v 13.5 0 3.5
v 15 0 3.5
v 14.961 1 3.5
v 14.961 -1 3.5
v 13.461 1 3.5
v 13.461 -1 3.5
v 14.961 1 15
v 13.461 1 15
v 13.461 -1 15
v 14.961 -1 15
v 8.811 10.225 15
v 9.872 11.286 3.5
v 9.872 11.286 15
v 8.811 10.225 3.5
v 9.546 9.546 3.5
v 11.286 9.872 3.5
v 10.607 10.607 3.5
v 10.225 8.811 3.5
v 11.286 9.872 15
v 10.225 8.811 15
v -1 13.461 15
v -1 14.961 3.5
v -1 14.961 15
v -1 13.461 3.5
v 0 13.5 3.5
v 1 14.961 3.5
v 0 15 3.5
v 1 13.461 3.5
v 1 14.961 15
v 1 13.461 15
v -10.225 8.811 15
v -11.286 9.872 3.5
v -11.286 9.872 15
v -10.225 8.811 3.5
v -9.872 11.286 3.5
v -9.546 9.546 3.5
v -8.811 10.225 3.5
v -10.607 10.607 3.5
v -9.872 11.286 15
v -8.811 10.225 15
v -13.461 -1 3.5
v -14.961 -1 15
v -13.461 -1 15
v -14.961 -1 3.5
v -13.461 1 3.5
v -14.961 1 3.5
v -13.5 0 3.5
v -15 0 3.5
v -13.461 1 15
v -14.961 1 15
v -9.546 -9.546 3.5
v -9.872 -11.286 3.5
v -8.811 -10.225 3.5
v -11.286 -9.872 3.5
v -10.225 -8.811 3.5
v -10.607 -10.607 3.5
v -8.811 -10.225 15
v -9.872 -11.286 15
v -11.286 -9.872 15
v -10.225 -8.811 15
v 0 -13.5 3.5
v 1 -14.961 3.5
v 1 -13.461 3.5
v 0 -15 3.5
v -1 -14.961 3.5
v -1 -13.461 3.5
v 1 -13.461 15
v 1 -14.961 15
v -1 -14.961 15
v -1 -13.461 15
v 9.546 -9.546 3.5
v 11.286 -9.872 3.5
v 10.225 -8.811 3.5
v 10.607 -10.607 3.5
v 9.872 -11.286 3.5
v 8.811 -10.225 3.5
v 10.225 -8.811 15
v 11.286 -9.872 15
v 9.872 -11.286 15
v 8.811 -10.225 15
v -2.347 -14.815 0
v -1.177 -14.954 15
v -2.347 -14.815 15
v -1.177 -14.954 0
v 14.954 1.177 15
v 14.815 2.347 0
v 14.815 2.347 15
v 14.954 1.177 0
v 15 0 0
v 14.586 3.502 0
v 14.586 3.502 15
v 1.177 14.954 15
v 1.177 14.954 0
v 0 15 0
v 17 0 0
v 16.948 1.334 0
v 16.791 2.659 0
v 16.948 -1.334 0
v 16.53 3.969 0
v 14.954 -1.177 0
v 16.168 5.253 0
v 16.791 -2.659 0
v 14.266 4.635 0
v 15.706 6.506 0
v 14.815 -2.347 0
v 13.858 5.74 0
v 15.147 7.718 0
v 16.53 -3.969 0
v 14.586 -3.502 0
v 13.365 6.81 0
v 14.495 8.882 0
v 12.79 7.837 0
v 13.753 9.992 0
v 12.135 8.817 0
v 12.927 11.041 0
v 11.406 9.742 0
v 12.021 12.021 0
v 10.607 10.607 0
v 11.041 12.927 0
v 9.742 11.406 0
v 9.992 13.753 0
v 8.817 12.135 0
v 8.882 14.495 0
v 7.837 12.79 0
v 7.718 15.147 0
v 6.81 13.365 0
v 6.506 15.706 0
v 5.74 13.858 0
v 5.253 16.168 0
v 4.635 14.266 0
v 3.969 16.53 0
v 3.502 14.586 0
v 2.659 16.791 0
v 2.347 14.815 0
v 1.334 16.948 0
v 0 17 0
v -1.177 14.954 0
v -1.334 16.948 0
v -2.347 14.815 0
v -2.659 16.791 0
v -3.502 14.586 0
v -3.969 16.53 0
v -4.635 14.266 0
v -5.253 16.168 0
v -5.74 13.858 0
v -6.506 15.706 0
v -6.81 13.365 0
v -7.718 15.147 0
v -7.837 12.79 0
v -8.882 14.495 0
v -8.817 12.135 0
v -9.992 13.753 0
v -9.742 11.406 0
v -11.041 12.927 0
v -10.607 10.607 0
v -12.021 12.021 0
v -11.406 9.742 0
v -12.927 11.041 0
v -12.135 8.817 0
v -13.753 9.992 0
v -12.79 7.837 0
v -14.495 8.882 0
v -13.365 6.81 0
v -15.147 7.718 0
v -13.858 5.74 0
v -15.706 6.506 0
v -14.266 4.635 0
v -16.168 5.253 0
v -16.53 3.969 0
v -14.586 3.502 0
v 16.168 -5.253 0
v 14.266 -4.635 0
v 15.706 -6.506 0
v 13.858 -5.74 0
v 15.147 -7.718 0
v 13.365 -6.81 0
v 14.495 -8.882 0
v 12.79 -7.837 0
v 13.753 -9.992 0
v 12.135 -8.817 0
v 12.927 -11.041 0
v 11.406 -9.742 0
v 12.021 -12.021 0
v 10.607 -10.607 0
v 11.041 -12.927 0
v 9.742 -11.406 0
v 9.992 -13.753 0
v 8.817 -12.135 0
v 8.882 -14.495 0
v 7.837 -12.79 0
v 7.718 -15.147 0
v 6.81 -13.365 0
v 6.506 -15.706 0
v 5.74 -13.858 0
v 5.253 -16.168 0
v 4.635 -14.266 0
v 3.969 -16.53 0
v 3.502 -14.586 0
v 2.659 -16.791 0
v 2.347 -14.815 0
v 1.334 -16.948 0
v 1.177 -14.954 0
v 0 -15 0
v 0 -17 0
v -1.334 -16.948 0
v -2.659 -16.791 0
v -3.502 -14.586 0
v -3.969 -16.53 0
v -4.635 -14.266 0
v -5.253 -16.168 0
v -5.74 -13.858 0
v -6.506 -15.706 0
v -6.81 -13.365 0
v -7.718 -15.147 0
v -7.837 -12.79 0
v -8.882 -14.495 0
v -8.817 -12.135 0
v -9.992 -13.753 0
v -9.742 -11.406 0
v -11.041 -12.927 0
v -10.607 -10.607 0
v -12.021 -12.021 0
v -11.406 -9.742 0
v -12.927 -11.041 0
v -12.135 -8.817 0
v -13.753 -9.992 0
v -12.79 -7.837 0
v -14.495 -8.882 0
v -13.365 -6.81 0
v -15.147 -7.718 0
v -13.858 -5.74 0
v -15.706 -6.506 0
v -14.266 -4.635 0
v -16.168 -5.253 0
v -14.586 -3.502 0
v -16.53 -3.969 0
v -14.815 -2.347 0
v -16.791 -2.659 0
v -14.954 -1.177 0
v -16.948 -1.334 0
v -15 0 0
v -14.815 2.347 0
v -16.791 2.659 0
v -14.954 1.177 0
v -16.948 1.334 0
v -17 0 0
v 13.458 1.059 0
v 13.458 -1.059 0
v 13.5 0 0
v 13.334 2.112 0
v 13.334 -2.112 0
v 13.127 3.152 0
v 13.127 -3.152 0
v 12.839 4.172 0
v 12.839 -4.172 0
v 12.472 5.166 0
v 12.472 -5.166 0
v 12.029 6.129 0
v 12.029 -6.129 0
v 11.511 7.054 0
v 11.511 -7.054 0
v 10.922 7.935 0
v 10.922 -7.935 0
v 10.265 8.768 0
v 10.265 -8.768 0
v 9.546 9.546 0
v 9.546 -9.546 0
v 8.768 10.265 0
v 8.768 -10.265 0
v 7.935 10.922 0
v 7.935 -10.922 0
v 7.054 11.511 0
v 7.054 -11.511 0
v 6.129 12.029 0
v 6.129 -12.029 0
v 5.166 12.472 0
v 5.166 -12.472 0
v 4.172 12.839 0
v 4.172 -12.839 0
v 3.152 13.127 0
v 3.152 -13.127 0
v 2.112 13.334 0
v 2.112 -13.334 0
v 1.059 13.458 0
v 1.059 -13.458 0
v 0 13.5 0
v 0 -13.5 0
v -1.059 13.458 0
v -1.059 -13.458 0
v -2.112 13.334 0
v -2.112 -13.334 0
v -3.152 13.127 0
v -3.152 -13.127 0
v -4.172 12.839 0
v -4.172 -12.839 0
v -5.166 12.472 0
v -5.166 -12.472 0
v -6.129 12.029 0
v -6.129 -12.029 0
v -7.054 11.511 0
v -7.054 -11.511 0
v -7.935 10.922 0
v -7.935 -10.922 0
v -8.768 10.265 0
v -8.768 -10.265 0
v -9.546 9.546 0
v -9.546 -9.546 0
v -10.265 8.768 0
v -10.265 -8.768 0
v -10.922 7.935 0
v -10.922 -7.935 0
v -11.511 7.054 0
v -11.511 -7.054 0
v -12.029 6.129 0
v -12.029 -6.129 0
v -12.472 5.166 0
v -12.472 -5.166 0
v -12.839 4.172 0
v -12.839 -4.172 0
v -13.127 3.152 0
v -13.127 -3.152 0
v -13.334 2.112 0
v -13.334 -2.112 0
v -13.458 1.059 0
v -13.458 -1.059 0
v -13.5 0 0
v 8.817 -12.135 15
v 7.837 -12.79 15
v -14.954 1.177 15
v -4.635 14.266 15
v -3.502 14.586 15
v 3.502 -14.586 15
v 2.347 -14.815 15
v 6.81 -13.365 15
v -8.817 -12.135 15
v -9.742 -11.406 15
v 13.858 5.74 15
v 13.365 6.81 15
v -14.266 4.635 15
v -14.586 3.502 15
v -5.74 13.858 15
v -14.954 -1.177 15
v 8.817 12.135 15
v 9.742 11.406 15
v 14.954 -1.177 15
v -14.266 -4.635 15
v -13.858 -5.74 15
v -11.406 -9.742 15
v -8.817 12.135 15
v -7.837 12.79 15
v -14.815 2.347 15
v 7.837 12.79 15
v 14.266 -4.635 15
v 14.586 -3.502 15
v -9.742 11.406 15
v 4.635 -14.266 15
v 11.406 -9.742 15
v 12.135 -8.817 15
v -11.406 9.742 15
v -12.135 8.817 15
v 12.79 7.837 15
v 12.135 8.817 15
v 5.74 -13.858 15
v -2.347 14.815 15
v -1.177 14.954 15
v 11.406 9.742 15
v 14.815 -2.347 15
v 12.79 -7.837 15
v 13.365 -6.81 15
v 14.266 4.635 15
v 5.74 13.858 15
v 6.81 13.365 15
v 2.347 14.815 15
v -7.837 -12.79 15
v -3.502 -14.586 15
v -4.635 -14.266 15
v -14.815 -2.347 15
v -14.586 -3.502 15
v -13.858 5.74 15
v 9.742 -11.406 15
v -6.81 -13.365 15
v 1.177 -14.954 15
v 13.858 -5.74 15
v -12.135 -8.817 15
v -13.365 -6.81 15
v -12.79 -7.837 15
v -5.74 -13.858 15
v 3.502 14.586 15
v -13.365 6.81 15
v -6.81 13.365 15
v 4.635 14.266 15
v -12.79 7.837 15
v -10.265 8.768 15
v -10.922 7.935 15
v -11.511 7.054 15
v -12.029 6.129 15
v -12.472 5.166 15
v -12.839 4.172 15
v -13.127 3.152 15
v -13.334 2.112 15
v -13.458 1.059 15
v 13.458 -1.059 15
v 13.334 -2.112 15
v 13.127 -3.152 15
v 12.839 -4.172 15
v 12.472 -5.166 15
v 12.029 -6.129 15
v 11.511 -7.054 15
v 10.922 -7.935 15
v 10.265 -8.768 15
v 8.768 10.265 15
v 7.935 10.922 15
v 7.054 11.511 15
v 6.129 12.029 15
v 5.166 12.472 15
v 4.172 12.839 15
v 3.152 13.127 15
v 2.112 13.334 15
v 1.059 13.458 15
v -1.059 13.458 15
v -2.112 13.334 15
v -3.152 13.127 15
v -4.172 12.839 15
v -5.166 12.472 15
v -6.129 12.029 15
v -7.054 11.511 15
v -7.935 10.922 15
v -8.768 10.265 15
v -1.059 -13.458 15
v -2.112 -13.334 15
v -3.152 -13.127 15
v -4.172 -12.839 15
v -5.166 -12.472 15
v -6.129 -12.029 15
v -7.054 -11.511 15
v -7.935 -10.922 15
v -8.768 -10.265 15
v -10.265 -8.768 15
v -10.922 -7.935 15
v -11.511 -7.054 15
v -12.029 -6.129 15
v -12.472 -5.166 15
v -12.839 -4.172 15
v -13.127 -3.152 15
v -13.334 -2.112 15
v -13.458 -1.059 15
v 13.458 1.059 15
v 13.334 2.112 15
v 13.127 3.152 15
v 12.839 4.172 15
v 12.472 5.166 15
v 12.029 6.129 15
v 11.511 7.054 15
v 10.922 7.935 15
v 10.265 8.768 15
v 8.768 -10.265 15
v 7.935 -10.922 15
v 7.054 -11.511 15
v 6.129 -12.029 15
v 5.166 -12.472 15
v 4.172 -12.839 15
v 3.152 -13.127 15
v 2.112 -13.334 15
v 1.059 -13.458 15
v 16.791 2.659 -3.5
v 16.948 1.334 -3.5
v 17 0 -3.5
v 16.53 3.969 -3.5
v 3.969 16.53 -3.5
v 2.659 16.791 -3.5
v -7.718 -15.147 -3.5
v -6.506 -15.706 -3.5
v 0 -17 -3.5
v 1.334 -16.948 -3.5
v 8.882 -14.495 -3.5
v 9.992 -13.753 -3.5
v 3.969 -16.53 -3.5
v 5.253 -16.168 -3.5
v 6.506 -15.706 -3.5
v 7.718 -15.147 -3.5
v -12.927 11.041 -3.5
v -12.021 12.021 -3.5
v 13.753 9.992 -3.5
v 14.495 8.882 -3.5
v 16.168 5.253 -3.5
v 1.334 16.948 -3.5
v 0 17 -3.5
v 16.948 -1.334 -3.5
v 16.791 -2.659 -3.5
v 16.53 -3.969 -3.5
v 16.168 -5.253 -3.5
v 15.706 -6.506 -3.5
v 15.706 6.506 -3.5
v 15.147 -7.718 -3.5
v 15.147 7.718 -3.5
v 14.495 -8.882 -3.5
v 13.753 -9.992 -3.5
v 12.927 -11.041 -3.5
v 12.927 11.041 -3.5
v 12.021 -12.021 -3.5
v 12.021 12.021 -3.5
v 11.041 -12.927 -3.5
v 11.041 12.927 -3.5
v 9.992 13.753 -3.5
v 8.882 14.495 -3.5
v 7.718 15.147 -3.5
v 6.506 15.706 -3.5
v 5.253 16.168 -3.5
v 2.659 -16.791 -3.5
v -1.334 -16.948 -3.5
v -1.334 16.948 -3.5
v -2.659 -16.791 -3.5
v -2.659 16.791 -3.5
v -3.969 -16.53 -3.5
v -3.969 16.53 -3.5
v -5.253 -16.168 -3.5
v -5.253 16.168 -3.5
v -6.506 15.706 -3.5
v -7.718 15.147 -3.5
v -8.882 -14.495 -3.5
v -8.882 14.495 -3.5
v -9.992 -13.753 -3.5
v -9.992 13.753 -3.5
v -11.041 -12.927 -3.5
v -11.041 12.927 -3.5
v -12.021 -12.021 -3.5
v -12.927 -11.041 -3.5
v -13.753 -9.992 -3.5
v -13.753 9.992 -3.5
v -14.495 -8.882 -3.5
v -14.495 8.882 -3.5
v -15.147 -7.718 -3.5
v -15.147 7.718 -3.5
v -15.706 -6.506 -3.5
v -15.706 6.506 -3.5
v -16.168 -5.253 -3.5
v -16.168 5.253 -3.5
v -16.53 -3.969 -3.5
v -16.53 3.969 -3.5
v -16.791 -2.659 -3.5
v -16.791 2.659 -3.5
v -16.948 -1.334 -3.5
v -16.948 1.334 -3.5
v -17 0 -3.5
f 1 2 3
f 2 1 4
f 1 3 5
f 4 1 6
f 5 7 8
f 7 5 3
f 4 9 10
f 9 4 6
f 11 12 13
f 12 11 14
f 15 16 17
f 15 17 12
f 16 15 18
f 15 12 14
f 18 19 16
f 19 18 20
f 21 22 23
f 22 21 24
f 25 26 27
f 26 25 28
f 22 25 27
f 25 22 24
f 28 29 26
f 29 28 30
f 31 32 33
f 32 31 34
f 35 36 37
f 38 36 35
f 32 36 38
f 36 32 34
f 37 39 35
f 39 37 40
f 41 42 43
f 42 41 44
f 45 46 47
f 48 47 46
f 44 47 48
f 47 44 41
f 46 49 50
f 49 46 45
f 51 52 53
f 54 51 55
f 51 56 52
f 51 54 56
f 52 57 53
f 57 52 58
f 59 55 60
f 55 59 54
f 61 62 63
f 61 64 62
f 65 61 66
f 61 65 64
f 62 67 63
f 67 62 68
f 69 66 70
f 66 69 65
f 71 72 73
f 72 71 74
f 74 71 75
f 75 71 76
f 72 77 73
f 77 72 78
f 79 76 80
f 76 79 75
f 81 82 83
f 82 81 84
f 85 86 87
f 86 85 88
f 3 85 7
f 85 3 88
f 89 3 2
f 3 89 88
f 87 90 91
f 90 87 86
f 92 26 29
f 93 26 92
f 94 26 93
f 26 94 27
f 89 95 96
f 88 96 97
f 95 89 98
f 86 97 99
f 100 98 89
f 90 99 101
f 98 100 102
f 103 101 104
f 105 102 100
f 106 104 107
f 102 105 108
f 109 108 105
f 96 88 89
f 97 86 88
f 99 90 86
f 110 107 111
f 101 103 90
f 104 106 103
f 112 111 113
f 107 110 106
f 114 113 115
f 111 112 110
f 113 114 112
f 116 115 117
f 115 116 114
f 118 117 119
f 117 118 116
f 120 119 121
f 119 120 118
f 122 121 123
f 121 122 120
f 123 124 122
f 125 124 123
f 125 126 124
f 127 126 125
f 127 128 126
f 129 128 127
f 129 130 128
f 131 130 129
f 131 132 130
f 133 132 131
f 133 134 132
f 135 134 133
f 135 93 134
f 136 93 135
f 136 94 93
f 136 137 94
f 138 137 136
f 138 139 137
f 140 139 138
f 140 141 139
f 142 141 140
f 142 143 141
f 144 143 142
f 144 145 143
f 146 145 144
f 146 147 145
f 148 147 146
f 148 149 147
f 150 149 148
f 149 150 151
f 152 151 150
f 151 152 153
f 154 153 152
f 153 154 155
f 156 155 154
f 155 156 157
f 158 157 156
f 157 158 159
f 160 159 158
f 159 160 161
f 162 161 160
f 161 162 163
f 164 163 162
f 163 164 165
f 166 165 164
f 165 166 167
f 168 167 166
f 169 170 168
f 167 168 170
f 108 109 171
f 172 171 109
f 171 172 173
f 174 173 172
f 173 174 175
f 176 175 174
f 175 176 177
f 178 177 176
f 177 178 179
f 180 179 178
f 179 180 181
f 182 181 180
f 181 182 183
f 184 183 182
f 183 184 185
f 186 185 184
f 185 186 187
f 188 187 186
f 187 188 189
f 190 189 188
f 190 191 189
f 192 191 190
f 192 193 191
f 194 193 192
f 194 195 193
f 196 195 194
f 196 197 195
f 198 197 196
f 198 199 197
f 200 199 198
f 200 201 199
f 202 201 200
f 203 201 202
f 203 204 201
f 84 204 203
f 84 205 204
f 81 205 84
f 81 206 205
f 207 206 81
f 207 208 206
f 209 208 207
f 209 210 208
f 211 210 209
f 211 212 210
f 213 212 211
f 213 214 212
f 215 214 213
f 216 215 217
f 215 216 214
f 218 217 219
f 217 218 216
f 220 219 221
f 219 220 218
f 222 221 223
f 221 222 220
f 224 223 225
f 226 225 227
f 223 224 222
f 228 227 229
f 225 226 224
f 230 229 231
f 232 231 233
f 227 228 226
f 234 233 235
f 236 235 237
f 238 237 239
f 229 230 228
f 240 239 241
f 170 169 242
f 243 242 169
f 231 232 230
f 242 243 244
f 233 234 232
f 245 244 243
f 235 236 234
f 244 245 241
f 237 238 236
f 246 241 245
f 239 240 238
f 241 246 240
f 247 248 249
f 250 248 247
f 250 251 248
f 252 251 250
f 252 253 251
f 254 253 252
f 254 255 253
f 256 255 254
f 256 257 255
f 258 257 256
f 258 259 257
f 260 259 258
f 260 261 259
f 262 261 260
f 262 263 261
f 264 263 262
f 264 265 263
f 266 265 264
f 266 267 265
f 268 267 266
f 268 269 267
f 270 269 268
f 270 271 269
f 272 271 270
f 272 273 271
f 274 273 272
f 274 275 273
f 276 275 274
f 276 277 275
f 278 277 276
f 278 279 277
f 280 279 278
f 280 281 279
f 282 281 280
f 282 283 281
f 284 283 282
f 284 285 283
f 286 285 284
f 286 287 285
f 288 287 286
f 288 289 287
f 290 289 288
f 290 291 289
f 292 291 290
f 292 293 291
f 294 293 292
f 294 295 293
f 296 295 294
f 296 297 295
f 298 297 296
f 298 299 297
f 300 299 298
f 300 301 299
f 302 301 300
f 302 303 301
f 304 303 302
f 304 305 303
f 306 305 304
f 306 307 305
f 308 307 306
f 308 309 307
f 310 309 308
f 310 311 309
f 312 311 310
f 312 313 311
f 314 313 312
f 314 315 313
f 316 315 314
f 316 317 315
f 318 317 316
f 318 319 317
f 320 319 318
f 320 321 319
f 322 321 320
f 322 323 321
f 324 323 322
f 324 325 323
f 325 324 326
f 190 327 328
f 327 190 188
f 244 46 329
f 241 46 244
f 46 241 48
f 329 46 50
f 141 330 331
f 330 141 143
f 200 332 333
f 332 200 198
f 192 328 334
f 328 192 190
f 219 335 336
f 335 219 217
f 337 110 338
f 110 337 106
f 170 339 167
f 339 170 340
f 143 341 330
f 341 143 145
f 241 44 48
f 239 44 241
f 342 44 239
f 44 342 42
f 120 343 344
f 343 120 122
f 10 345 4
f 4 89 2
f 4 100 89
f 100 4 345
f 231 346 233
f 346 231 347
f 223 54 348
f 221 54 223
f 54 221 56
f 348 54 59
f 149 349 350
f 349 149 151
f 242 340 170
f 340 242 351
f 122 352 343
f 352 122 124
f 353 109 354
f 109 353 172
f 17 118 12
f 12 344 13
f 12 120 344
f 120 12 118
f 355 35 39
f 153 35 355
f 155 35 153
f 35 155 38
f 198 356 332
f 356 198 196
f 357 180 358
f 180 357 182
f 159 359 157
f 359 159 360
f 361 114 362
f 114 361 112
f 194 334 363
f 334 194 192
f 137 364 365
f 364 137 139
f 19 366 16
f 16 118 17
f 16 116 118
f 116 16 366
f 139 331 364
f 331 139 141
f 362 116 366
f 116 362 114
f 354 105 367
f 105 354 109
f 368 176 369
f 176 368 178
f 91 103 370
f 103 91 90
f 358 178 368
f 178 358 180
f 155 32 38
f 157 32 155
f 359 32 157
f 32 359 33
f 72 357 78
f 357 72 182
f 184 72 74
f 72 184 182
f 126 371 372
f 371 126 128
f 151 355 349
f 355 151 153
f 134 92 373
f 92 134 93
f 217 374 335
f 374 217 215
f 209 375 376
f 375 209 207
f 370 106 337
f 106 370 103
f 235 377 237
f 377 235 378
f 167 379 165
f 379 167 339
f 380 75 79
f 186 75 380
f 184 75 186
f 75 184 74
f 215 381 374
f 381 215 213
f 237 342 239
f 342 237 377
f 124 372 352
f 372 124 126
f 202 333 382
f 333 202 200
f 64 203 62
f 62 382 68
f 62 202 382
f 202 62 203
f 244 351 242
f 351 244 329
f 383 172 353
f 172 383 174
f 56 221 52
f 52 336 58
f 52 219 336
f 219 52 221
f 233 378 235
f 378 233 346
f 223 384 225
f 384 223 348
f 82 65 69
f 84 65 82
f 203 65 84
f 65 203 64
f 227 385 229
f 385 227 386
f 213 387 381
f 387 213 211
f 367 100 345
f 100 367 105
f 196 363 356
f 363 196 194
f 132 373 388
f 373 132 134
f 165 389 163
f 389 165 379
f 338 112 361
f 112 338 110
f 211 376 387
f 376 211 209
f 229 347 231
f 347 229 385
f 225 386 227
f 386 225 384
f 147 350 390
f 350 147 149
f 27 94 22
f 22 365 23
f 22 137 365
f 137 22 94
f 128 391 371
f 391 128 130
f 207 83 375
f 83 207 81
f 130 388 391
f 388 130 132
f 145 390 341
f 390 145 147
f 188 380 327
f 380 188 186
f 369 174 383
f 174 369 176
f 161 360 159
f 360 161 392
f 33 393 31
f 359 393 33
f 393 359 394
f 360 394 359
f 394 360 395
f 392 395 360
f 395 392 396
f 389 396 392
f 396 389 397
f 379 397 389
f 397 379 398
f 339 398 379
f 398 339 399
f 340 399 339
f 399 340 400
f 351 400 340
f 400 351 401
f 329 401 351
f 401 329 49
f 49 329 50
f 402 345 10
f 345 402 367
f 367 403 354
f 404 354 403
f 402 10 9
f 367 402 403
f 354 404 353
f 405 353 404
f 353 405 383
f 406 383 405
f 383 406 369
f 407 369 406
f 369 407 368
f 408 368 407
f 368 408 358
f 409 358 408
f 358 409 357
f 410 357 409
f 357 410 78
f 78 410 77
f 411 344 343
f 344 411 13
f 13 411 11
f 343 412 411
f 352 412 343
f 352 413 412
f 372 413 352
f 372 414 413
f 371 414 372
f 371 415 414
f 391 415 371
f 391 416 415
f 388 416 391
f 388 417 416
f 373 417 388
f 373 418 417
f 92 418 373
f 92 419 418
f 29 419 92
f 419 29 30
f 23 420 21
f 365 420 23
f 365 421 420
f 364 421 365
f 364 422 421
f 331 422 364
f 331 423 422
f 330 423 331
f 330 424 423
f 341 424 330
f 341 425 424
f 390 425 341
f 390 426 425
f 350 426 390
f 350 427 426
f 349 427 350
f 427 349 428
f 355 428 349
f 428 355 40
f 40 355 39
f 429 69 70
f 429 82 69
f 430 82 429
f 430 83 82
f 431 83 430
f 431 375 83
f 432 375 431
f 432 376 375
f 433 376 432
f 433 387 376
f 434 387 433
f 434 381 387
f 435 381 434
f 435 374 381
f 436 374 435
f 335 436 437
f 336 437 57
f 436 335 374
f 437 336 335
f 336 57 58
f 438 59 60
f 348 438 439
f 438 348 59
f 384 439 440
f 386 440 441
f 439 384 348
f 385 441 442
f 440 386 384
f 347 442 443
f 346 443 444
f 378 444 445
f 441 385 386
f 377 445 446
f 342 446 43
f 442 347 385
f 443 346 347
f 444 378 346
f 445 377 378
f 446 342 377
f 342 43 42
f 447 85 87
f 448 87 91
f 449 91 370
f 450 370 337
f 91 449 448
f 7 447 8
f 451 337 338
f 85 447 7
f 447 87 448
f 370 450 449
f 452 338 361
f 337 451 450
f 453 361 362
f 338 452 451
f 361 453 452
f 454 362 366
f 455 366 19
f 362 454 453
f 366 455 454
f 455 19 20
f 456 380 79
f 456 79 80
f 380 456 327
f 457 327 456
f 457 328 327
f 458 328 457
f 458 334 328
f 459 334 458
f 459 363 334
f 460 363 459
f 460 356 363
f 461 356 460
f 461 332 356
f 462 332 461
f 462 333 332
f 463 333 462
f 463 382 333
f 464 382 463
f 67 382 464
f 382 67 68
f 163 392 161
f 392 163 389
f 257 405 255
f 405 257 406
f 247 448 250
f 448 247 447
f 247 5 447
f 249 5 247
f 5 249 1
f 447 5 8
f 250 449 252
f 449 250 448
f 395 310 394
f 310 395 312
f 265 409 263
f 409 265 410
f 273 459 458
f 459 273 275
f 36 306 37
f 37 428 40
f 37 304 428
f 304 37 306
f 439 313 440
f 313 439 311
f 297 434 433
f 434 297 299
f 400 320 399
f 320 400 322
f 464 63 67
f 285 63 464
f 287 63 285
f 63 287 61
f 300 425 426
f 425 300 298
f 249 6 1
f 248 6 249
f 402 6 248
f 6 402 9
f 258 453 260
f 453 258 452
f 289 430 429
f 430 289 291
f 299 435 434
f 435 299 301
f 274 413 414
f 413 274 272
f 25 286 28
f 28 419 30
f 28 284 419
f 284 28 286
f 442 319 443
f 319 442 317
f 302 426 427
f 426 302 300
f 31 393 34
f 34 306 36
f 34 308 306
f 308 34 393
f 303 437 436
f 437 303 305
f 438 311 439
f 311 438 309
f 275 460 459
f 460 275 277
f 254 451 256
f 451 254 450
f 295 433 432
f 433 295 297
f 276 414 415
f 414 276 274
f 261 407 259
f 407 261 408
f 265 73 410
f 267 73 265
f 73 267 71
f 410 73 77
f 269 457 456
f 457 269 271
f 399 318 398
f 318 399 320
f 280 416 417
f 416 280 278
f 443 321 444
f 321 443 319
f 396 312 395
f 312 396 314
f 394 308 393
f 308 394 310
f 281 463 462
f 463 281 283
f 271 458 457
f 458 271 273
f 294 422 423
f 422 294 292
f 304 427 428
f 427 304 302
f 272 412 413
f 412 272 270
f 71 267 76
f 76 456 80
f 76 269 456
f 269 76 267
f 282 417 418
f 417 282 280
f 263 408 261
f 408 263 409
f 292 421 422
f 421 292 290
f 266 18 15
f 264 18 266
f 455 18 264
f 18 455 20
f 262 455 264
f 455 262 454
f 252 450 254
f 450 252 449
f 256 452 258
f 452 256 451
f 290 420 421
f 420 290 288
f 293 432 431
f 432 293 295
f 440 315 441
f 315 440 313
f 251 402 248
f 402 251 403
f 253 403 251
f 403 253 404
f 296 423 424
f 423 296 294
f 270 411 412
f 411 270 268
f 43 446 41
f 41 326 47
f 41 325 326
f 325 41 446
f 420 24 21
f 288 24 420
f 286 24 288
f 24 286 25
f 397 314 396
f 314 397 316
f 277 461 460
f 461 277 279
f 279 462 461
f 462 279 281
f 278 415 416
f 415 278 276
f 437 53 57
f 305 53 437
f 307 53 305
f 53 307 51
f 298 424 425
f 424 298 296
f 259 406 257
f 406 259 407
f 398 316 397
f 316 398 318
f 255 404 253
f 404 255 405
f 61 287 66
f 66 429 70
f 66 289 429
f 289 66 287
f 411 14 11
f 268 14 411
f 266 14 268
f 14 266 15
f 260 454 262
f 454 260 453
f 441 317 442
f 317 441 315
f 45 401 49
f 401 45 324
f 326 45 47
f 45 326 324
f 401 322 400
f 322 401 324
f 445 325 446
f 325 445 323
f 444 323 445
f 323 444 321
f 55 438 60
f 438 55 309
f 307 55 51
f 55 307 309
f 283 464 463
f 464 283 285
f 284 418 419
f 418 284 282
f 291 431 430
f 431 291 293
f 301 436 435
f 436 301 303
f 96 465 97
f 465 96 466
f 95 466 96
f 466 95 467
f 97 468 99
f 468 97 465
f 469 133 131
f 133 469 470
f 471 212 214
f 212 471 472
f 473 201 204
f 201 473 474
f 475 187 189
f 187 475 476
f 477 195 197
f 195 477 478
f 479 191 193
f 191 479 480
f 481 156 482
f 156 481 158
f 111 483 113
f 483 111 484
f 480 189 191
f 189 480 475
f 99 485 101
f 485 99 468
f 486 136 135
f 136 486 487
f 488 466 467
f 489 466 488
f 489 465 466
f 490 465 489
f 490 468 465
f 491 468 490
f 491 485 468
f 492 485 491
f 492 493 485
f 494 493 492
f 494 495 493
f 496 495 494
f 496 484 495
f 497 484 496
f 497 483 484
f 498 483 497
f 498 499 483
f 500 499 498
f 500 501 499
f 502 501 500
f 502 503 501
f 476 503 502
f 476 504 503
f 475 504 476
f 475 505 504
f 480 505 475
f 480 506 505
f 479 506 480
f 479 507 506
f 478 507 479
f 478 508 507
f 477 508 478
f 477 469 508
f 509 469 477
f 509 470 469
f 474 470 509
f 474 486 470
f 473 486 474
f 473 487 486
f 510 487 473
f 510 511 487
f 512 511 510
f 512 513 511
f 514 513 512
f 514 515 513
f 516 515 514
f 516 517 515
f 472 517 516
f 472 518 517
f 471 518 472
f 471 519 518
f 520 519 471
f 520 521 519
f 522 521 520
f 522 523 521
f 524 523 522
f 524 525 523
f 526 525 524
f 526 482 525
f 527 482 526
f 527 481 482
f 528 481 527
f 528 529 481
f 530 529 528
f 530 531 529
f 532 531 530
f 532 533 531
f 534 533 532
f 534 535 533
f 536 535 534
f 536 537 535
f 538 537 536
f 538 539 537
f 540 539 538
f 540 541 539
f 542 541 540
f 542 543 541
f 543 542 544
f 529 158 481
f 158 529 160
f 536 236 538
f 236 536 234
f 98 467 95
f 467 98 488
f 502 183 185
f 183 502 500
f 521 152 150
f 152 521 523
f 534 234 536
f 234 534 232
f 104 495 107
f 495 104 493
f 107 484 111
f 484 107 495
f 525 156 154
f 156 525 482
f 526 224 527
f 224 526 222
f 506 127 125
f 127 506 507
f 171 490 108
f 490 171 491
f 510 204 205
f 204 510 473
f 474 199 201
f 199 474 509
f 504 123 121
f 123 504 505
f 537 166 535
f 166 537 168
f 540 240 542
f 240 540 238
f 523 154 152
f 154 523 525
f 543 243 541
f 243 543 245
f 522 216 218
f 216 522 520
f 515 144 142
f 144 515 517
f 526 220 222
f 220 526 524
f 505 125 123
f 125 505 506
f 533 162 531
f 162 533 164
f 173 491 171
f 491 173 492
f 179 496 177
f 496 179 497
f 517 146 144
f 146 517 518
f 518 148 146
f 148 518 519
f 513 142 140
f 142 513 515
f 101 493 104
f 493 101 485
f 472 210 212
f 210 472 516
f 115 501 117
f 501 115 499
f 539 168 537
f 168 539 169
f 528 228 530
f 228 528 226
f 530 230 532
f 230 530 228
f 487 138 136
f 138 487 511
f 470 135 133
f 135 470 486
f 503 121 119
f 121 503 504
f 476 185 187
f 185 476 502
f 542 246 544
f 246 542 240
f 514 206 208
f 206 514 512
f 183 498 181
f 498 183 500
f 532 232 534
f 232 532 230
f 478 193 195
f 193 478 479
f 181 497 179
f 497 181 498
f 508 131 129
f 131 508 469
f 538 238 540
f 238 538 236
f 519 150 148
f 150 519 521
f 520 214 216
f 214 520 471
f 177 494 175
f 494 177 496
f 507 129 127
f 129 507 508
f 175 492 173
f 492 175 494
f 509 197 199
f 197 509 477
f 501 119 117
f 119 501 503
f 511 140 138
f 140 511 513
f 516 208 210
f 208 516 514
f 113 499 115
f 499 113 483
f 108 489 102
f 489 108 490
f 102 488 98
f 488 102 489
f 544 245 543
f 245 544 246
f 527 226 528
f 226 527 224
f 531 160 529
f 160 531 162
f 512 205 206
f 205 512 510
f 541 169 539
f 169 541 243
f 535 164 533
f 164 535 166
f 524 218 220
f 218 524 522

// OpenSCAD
n = 8;
w = 2;
h = 15;
base = 3.5;
outer = 15;
wall = 0.75;
translate([0,0,h/2]) difference () {
	cylinder(r=outer, h=h, center=true, $fn=80);
	cylinder(r=outer-2*wall, h=h+5, center=true, $fn=80);
	for (i=[0:n-1]) {
		rotate([0,0,i*360/n]) translate([outer,0,base]) cube([4*wall+0.1,w,h], center=true);
	}
}
translate([0,0,-base]) cylinder(r=outer+2, h=base, $fn=80);
